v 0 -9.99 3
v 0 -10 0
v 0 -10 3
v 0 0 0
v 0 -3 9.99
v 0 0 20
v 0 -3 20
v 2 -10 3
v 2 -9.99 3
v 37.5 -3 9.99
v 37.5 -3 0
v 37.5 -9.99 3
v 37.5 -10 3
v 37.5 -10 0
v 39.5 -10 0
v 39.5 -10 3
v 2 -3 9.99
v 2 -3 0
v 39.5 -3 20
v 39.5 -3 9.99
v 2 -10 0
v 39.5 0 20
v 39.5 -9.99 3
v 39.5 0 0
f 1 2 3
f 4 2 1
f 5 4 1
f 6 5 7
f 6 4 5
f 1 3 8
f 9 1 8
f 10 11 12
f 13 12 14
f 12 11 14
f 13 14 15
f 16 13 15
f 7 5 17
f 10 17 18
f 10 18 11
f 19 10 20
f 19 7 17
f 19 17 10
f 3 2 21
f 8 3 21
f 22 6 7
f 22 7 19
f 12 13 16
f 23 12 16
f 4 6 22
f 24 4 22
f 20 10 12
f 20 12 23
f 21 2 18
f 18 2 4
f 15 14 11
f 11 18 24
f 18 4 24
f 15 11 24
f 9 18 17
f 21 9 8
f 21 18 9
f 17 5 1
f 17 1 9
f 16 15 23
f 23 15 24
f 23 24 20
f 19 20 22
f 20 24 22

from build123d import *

# Parameters (mm, degrees)
SKETCH_W        = 39.5
SKETCH_H        = 20
PAD_DEPTH       = 3
SKETCH001_W     = 2
SKETCH001_H     = 10
PAD001_DEPTH    = 3
CHAMFER_SIZE    = 6.99
CHAMFER001_SIZE = 6.99


with BuildPart() as part:
    # Sketch → Pad (new body)
    with BuildSketch(Plane.XZ):
        with Locations((19.75, 10)):
            Rectangle(SKETCH_W, SKETCH_H)
    extrude(amount=PAD_DEPTH)

    # Sketch001 → Pad001 (new body)
    with BuildSketch(Plane(origin=(0, 0, 0), x_dir=(1, 0, 0), z_dir=(0, 0, -1))):
        with Locations((38.5, 5)):
            Rectangle(SKETCH001_W, SKETCH001_H)
        with Locations((1, 5)):
            Rectangle(SKETCH001_W, SKETCH001_H)
    extrude(amount=-PAD001_DEPTH)

    # Chamfer
    chamfer_edges = [part.edges().sort_by_distance(p)[0] for p in [
        (38.5, -3, 3),
    ]]
    chamfer(chamfer_edges, length=CHAMFER_SIZE)

    # Chamfer001
    chamfer001_edges = [part.edges().sort_by_distance(p)[0] for p in [
        (1, -3, 3),
    ]]
    chamfer(chamfer001_edges, length=CHAMFER001_SIZE)


solid = part.part
